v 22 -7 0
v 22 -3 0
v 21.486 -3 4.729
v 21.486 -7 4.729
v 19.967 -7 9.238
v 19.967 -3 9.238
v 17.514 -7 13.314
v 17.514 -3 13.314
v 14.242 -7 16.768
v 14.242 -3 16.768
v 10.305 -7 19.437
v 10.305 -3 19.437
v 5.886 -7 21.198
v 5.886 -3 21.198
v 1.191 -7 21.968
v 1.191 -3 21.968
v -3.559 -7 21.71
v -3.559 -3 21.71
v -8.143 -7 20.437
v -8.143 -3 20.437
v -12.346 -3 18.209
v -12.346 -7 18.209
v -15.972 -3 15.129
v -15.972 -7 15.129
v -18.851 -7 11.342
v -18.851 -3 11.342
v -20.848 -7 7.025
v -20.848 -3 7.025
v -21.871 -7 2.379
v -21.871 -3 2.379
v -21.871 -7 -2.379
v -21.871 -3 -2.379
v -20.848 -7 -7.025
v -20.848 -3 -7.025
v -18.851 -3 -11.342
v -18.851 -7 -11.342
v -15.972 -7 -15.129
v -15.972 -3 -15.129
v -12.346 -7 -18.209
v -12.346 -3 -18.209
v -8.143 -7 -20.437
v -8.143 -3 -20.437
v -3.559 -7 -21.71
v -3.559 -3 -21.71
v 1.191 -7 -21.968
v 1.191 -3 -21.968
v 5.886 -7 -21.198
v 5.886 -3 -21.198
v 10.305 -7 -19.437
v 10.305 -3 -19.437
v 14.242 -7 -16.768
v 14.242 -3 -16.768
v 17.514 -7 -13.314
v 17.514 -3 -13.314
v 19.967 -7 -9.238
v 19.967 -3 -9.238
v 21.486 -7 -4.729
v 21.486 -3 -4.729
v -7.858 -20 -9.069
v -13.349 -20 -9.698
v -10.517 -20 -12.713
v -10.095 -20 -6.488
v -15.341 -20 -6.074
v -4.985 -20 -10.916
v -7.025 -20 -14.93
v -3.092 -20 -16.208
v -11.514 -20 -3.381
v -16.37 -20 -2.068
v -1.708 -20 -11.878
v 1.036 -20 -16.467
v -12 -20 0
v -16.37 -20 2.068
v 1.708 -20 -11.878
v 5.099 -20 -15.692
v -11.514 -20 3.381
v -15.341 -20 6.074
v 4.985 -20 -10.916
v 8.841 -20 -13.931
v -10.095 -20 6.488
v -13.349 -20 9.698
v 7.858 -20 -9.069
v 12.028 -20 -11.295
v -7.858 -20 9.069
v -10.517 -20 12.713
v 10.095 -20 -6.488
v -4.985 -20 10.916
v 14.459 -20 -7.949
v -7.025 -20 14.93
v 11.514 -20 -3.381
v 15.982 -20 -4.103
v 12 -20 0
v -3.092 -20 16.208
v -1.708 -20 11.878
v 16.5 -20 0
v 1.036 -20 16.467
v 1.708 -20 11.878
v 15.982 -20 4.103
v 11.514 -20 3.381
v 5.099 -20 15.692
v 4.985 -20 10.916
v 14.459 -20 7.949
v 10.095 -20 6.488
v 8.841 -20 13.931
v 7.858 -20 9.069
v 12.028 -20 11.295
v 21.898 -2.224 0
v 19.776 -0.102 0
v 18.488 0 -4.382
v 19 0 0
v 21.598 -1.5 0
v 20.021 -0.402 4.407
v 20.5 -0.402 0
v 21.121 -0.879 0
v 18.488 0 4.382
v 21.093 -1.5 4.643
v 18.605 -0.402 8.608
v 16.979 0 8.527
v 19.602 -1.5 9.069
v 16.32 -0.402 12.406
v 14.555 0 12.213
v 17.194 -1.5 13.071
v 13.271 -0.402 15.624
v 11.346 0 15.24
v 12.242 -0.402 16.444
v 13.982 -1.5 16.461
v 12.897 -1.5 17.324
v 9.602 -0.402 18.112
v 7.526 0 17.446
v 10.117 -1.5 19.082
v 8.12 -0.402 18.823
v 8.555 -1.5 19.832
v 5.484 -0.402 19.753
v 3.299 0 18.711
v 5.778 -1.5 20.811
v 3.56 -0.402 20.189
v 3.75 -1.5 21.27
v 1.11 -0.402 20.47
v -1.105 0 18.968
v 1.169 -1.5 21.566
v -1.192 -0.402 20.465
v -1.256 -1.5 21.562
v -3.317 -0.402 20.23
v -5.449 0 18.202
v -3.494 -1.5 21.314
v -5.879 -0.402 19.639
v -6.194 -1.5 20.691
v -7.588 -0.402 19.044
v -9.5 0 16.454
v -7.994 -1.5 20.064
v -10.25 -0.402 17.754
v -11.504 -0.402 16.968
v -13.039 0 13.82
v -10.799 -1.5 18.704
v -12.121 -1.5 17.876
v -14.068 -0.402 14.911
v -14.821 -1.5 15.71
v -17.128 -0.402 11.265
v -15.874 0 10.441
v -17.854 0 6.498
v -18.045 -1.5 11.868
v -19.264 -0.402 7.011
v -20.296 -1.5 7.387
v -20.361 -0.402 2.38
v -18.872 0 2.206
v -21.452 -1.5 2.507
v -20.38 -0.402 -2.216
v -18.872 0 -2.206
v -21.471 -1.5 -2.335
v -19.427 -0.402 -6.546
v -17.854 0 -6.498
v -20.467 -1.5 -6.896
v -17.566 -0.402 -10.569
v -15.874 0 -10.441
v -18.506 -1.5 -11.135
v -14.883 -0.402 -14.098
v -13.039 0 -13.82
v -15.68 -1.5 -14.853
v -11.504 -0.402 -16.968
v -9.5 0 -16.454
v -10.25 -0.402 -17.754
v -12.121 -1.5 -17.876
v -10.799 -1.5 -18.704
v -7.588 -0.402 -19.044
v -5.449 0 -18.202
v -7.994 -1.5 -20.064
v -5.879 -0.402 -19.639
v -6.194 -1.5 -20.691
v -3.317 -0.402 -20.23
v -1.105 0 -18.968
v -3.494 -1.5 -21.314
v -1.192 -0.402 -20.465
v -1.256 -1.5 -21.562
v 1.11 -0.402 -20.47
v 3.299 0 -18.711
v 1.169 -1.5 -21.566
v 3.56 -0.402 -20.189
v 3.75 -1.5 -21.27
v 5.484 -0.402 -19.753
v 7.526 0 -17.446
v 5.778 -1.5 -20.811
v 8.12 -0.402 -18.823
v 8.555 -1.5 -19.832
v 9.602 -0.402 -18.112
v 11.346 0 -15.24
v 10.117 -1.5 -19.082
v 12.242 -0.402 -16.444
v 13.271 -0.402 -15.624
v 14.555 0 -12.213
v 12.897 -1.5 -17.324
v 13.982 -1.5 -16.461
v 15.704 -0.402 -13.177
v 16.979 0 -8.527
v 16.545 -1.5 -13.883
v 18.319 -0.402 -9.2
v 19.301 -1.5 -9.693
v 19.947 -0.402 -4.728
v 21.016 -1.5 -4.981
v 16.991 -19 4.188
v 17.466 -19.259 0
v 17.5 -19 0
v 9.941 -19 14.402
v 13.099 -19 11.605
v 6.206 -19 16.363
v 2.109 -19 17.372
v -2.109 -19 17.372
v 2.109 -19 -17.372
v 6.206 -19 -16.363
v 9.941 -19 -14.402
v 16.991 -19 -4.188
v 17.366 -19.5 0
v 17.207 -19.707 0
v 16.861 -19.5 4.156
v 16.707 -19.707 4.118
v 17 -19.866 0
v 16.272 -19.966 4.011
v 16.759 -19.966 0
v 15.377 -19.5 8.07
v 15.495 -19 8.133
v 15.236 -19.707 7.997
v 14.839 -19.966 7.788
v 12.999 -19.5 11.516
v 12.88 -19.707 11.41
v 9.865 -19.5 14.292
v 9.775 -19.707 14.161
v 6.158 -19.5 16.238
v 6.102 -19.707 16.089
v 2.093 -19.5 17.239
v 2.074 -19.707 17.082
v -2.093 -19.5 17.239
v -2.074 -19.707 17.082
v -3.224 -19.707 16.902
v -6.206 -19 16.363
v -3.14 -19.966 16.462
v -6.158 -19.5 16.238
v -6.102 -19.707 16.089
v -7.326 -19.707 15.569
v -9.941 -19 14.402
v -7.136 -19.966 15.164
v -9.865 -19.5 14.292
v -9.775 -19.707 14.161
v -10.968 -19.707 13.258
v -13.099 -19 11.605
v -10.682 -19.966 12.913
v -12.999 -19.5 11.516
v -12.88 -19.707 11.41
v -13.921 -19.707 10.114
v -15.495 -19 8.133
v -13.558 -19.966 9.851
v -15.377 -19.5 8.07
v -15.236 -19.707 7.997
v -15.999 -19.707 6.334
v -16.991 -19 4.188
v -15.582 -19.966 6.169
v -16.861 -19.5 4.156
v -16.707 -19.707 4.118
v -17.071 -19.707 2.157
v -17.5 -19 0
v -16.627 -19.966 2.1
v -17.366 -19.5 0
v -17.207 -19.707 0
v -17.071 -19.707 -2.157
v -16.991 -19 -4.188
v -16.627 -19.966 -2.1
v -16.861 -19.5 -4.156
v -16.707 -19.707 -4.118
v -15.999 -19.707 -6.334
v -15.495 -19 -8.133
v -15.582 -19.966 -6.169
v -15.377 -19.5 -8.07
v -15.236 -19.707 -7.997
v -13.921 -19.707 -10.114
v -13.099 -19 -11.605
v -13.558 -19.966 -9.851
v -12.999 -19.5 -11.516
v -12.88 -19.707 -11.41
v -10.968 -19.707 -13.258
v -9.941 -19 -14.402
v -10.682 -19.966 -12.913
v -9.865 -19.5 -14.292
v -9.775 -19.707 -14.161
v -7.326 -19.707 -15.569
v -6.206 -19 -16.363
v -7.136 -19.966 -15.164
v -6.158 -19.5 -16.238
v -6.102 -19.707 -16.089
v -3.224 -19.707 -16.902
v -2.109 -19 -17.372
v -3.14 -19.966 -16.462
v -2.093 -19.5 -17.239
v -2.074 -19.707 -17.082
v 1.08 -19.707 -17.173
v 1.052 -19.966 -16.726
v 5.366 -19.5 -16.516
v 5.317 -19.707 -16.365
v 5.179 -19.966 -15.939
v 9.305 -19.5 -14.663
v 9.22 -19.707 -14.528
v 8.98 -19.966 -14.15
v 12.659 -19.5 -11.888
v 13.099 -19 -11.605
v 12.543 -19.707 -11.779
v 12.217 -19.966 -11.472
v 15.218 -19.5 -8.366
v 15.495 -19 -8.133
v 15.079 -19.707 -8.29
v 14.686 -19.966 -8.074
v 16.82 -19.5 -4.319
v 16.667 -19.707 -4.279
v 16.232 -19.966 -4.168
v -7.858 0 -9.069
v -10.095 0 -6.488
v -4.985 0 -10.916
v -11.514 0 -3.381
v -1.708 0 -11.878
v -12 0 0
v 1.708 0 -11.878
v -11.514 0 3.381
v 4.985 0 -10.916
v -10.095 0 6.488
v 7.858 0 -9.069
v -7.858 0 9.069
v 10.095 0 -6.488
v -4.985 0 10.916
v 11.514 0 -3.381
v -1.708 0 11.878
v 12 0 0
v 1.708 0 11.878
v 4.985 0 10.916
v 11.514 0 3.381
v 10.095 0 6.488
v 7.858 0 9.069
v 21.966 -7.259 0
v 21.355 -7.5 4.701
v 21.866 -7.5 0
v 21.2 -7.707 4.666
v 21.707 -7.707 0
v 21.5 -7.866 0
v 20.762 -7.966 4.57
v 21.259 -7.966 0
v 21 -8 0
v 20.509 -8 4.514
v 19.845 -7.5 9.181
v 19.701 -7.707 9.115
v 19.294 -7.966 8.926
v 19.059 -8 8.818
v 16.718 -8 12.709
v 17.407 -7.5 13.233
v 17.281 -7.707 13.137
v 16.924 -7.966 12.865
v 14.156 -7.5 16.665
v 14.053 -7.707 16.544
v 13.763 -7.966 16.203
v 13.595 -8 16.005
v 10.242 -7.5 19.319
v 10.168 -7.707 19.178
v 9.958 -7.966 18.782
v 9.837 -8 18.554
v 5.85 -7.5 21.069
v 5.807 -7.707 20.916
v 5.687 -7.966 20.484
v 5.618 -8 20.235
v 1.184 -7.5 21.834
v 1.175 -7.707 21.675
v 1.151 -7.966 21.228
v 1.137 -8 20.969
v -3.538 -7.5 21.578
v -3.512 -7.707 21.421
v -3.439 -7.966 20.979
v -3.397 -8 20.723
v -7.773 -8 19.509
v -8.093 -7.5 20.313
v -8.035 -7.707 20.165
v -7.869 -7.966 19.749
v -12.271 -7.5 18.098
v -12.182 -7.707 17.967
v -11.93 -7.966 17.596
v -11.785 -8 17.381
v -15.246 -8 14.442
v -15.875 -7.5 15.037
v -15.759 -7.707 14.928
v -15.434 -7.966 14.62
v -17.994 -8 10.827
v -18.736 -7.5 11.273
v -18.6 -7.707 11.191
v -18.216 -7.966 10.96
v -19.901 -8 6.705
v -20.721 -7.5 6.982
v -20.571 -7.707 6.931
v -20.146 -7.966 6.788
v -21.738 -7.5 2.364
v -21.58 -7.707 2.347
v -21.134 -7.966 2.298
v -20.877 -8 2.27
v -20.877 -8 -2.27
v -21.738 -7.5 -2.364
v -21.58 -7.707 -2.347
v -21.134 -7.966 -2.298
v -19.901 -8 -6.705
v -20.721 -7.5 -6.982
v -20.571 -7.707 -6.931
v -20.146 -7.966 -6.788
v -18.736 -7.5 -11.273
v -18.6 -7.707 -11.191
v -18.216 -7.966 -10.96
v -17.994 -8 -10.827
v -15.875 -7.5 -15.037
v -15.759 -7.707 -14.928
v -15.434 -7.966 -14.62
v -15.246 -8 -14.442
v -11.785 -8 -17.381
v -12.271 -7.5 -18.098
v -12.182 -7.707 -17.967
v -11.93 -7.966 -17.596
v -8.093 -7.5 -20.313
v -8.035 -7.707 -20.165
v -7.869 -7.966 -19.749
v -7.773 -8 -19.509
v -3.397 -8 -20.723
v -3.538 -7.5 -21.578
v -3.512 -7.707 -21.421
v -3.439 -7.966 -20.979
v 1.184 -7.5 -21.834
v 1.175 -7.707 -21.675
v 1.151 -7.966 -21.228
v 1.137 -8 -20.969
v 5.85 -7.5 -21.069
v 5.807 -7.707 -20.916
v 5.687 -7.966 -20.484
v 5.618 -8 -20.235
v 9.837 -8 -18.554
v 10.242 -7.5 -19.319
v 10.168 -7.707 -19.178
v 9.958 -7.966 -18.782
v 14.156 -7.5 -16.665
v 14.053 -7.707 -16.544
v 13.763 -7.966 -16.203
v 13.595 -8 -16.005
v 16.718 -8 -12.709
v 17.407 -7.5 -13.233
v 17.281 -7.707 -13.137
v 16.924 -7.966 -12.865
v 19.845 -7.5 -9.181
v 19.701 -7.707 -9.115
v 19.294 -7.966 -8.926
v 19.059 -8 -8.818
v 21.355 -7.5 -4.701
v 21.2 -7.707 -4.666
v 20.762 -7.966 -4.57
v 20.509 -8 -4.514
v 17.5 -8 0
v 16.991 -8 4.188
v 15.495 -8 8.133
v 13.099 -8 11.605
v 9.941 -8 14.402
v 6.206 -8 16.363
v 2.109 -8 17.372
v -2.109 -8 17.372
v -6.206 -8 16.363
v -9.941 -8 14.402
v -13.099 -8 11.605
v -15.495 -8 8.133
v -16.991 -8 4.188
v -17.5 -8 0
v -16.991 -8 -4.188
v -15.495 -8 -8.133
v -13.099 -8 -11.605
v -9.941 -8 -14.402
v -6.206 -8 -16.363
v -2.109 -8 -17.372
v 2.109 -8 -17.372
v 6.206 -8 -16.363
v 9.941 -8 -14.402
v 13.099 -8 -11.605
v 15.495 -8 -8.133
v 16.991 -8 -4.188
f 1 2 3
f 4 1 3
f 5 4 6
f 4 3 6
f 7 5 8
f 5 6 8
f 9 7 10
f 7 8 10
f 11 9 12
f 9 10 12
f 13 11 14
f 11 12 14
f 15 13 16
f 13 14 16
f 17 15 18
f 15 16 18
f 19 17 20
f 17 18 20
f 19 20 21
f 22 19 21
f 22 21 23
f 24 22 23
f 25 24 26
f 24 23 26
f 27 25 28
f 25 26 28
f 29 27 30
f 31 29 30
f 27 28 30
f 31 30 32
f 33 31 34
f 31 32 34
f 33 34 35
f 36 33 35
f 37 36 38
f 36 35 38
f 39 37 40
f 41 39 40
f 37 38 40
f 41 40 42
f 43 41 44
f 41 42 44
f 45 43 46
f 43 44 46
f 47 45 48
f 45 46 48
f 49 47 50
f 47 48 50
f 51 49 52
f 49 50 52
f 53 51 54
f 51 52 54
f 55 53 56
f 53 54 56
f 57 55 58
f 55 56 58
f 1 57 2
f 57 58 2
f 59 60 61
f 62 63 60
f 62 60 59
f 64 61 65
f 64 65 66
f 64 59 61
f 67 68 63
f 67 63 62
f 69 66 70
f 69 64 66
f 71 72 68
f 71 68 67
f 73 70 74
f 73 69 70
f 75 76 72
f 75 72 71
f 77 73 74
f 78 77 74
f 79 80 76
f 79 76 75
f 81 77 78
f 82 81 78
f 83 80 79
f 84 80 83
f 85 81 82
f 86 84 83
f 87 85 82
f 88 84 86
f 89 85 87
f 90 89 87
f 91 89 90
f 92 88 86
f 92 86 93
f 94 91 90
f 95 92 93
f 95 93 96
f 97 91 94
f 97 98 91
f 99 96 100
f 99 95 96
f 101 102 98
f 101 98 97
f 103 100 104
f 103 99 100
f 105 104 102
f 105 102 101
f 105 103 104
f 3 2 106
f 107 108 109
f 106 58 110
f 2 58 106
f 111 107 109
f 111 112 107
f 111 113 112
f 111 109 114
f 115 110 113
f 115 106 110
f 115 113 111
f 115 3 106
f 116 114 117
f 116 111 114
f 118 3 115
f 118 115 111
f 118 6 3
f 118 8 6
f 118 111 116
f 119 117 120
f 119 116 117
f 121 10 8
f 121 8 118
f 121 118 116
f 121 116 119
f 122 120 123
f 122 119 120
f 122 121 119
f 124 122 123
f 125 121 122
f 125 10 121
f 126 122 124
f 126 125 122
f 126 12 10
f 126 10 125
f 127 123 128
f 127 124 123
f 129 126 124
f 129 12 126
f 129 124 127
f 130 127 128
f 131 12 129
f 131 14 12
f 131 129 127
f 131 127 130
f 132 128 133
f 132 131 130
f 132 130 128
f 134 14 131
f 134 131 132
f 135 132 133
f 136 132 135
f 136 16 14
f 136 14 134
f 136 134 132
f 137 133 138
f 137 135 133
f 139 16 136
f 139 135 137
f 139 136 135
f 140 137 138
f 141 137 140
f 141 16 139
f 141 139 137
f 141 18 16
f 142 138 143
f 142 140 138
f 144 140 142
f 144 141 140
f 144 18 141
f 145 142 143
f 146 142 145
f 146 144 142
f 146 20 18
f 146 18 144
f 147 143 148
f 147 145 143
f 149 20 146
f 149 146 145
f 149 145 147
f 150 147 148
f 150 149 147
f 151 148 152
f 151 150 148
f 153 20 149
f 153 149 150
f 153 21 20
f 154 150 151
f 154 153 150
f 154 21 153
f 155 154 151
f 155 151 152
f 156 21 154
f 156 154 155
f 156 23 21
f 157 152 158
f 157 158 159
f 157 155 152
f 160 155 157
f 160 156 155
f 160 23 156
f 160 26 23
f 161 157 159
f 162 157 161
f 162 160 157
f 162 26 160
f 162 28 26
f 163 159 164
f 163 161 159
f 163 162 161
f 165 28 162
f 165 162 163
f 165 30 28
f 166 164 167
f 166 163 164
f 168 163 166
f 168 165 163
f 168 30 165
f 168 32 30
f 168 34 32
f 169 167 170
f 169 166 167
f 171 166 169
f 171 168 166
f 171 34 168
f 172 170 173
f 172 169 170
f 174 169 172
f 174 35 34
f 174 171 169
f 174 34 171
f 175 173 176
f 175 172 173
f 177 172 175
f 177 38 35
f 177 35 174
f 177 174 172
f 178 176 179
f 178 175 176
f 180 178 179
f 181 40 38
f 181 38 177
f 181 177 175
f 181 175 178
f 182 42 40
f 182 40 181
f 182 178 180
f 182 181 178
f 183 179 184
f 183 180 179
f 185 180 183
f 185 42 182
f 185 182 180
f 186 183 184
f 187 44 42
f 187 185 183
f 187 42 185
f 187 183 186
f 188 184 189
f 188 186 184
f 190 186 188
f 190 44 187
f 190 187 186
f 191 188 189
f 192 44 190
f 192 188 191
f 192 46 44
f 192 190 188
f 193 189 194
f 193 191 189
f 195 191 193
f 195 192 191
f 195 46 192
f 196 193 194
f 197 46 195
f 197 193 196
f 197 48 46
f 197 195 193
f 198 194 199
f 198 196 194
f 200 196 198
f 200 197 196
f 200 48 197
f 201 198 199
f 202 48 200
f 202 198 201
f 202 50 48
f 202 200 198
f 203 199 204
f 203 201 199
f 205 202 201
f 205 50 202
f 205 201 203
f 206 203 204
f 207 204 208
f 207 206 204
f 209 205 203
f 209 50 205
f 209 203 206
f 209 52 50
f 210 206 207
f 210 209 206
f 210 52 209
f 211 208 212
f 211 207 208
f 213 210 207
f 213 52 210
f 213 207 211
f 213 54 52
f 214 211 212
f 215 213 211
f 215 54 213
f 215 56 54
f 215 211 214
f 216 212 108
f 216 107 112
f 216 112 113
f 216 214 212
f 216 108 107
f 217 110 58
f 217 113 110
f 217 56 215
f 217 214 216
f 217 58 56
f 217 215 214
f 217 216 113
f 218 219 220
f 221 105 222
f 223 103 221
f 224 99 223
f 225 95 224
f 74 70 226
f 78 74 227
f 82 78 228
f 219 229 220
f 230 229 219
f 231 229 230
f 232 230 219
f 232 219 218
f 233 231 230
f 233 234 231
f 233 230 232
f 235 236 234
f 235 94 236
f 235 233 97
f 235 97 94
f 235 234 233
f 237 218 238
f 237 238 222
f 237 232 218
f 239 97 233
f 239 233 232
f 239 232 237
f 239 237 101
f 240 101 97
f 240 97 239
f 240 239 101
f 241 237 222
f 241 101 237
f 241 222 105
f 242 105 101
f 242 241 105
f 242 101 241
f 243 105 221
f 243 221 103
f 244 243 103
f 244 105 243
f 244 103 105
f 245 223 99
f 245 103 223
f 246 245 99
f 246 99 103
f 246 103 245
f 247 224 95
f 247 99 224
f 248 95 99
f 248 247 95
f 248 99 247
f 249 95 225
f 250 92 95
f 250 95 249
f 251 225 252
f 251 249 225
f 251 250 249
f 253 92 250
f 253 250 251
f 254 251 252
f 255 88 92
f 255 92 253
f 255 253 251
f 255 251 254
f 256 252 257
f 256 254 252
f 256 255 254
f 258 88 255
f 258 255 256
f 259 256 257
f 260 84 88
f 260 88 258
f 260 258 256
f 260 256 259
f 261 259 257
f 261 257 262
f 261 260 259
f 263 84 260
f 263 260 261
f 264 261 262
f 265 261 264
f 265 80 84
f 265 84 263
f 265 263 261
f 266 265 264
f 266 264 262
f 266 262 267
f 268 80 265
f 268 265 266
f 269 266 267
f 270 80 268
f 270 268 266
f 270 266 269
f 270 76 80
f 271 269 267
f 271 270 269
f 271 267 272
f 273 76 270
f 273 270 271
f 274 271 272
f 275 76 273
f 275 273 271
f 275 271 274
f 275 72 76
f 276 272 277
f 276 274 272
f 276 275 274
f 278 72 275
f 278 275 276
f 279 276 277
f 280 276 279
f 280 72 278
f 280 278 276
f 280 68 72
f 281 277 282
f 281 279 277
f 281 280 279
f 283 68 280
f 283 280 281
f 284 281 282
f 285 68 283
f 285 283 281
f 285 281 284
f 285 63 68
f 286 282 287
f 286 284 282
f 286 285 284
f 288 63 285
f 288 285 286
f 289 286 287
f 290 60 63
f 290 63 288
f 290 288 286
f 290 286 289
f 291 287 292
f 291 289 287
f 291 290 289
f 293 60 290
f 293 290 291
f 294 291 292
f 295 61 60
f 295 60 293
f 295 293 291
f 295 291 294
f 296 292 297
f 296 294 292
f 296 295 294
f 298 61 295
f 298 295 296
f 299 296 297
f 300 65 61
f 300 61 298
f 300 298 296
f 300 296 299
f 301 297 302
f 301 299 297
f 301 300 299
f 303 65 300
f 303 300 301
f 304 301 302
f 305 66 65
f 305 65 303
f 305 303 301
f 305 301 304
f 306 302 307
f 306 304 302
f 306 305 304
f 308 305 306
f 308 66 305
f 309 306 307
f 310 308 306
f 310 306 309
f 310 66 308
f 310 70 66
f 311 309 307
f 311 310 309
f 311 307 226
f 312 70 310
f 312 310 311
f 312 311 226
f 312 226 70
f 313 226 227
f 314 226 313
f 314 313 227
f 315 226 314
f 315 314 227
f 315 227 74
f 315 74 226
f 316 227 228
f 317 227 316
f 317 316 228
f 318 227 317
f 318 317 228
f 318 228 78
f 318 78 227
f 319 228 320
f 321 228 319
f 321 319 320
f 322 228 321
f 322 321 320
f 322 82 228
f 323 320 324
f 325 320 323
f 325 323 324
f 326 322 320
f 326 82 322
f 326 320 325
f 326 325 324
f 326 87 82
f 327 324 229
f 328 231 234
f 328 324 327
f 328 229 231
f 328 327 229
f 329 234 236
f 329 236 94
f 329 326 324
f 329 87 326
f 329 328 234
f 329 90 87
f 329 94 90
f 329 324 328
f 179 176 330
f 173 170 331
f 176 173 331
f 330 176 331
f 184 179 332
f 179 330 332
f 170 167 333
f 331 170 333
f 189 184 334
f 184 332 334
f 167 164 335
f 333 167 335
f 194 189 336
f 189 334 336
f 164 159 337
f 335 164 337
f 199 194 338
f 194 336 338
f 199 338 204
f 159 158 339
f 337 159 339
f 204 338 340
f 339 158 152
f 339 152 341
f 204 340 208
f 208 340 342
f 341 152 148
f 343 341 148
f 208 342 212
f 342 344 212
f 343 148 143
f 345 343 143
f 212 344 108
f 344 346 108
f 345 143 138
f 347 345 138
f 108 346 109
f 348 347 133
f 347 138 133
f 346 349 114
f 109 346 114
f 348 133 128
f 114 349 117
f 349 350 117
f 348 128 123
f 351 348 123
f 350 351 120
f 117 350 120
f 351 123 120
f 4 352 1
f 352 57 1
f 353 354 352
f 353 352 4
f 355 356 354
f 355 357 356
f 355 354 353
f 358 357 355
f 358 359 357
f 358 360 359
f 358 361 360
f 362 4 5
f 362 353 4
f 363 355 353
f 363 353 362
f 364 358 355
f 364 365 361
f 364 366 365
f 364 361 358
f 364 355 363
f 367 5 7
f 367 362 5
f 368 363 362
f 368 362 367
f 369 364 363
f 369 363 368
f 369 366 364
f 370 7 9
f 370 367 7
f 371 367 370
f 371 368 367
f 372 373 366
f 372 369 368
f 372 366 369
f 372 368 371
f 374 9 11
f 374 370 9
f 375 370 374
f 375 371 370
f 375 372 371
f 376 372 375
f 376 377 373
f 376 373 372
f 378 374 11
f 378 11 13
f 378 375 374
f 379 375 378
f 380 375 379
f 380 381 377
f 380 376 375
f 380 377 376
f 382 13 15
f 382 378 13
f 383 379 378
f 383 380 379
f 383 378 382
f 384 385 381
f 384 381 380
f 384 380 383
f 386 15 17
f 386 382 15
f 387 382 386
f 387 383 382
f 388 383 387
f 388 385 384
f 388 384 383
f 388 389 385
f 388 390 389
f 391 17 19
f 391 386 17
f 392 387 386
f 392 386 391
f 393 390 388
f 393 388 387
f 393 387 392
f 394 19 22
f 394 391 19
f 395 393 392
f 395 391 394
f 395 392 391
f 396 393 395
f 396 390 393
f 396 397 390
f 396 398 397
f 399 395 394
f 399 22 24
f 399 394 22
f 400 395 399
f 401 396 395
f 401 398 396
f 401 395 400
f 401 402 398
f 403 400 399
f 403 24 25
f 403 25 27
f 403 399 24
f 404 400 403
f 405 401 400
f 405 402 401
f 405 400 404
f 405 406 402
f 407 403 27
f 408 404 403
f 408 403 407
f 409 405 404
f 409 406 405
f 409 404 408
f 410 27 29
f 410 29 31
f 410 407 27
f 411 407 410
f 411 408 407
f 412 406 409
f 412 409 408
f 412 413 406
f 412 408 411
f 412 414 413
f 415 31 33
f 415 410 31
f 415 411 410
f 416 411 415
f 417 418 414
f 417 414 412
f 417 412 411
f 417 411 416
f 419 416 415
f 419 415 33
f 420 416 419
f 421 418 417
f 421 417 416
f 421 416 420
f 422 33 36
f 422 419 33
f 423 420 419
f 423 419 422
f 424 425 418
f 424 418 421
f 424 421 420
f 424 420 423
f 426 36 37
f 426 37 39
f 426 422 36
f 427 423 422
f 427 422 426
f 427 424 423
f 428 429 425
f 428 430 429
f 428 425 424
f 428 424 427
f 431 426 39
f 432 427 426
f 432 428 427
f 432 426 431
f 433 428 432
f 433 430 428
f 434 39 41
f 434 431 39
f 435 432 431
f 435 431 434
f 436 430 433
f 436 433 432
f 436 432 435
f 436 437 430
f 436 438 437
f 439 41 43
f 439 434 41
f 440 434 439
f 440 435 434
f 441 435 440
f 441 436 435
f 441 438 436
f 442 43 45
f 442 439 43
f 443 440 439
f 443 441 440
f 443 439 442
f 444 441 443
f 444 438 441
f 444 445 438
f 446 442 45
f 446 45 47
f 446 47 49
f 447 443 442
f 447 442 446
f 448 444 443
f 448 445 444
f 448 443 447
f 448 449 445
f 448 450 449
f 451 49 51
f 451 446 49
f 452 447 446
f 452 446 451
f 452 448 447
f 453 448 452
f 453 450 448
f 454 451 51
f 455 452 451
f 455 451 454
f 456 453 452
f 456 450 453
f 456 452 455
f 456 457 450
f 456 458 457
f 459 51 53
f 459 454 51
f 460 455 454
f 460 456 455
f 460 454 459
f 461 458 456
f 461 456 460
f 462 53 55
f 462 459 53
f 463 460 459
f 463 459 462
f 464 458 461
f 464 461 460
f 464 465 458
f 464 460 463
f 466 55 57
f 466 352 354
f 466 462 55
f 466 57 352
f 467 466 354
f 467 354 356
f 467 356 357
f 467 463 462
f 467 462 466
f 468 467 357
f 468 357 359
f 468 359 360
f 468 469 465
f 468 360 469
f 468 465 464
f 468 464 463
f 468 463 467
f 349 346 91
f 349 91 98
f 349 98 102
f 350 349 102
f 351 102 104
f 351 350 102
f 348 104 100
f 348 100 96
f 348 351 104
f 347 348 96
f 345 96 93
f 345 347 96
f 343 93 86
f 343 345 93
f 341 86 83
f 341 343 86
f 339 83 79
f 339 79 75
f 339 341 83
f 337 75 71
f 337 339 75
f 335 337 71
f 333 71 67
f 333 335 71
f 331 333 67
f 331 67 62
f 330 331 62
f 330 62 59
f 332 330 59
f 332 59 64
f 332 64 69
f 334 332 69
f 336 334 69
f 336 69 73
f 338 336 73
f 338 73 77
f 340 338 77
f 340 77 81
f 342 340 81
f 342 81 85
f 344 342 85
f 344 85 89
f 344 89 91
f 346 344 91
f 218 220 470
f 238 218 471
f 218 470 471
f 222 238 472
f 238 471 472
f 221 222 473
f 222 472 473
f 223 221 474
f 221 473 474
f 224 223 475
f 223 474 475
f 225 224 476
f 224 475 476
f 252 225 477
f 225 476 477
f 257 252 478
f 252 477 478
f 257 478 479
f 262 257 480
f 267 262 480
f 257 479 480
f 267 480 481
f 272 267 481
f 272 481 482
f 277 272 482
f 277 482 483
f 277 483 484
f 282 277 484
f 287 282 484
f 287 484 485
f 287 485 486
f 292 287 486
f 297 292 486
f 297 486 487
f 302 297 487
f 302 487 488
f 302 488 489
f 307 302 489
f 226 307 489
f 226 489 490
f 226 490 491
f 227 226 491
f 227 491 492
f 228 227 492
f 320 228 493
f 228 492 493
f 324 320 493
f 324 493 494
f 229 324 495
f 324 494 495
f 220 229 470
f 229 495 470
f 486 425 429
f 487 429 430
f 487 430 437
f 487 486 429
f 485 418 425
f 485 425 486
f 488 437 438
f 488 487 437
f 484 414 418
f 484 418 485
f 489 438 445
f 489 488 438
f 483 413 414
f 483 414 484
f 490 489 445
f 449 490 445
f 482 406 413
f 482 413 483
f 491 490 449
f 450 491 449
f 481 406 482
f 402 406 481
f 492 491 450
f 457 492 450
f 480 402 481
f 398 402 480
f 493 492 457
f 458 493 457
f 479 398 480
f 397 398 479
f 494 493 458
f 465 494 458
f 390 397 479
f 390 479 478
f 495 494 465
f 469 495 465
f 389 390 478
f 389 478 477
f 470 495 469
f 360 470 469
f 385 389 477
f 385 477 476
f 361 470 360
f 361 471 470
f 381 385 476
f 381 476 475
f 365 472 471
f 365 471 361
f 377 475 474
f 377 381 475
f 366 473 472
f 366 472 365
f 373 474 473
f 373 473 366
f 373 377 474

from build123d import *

# Parameters (mm, degrees)
F0_R     = 22
F0_R_2   = 17.5
F0_R_3   = 12
F1_DEPTH = 8
F2_DEPTH = 20
F3_R     = 3
F4_R     = 1
F5_R     = 1


with BuildPart() as f1:
    # F0 (on Front) → F1 (new body)
    with BuildSketch(Plane.XZ):
        Circle(F0_R)
        Circle(F0_R_2, mode=Mode.SUBTRACT)
        Circle(F0_R_2)
        Circle(F0_R_3, mode=Mode.SUBTRACT)
    extrude(amount=F1_DEPTH)

    # F0 (on Front) → F2 (join)
    with BuildSketch(Plane.XZ):
        Circle(F0_R_2)
        Circle(F0_R_3, mode=Mode.SUBTRACT)
    extrude(amount=F2_DEPTH)

    # F3
    f3_edges = [f1.edges().sort_by_distance(p)[0] for p in [
        (-22, 0, 0),
    ]]
    fillet(f3_edges, radius=F3_R)

    # F4
    f4_edges = [f1.edges().sort_by_distance(p)[0] for p in [
        (-22, -8, 0),
    ]]
    fillet(f4_edges, radius=F4_R)

    # F5
    f5_edges = [f1.edges().sort_by_distance(p)[0] for p in [
        (-17.5, -20, 0),
    ]]
    fillet(f5_edges, radius=F5_R)


solid = f1.part
